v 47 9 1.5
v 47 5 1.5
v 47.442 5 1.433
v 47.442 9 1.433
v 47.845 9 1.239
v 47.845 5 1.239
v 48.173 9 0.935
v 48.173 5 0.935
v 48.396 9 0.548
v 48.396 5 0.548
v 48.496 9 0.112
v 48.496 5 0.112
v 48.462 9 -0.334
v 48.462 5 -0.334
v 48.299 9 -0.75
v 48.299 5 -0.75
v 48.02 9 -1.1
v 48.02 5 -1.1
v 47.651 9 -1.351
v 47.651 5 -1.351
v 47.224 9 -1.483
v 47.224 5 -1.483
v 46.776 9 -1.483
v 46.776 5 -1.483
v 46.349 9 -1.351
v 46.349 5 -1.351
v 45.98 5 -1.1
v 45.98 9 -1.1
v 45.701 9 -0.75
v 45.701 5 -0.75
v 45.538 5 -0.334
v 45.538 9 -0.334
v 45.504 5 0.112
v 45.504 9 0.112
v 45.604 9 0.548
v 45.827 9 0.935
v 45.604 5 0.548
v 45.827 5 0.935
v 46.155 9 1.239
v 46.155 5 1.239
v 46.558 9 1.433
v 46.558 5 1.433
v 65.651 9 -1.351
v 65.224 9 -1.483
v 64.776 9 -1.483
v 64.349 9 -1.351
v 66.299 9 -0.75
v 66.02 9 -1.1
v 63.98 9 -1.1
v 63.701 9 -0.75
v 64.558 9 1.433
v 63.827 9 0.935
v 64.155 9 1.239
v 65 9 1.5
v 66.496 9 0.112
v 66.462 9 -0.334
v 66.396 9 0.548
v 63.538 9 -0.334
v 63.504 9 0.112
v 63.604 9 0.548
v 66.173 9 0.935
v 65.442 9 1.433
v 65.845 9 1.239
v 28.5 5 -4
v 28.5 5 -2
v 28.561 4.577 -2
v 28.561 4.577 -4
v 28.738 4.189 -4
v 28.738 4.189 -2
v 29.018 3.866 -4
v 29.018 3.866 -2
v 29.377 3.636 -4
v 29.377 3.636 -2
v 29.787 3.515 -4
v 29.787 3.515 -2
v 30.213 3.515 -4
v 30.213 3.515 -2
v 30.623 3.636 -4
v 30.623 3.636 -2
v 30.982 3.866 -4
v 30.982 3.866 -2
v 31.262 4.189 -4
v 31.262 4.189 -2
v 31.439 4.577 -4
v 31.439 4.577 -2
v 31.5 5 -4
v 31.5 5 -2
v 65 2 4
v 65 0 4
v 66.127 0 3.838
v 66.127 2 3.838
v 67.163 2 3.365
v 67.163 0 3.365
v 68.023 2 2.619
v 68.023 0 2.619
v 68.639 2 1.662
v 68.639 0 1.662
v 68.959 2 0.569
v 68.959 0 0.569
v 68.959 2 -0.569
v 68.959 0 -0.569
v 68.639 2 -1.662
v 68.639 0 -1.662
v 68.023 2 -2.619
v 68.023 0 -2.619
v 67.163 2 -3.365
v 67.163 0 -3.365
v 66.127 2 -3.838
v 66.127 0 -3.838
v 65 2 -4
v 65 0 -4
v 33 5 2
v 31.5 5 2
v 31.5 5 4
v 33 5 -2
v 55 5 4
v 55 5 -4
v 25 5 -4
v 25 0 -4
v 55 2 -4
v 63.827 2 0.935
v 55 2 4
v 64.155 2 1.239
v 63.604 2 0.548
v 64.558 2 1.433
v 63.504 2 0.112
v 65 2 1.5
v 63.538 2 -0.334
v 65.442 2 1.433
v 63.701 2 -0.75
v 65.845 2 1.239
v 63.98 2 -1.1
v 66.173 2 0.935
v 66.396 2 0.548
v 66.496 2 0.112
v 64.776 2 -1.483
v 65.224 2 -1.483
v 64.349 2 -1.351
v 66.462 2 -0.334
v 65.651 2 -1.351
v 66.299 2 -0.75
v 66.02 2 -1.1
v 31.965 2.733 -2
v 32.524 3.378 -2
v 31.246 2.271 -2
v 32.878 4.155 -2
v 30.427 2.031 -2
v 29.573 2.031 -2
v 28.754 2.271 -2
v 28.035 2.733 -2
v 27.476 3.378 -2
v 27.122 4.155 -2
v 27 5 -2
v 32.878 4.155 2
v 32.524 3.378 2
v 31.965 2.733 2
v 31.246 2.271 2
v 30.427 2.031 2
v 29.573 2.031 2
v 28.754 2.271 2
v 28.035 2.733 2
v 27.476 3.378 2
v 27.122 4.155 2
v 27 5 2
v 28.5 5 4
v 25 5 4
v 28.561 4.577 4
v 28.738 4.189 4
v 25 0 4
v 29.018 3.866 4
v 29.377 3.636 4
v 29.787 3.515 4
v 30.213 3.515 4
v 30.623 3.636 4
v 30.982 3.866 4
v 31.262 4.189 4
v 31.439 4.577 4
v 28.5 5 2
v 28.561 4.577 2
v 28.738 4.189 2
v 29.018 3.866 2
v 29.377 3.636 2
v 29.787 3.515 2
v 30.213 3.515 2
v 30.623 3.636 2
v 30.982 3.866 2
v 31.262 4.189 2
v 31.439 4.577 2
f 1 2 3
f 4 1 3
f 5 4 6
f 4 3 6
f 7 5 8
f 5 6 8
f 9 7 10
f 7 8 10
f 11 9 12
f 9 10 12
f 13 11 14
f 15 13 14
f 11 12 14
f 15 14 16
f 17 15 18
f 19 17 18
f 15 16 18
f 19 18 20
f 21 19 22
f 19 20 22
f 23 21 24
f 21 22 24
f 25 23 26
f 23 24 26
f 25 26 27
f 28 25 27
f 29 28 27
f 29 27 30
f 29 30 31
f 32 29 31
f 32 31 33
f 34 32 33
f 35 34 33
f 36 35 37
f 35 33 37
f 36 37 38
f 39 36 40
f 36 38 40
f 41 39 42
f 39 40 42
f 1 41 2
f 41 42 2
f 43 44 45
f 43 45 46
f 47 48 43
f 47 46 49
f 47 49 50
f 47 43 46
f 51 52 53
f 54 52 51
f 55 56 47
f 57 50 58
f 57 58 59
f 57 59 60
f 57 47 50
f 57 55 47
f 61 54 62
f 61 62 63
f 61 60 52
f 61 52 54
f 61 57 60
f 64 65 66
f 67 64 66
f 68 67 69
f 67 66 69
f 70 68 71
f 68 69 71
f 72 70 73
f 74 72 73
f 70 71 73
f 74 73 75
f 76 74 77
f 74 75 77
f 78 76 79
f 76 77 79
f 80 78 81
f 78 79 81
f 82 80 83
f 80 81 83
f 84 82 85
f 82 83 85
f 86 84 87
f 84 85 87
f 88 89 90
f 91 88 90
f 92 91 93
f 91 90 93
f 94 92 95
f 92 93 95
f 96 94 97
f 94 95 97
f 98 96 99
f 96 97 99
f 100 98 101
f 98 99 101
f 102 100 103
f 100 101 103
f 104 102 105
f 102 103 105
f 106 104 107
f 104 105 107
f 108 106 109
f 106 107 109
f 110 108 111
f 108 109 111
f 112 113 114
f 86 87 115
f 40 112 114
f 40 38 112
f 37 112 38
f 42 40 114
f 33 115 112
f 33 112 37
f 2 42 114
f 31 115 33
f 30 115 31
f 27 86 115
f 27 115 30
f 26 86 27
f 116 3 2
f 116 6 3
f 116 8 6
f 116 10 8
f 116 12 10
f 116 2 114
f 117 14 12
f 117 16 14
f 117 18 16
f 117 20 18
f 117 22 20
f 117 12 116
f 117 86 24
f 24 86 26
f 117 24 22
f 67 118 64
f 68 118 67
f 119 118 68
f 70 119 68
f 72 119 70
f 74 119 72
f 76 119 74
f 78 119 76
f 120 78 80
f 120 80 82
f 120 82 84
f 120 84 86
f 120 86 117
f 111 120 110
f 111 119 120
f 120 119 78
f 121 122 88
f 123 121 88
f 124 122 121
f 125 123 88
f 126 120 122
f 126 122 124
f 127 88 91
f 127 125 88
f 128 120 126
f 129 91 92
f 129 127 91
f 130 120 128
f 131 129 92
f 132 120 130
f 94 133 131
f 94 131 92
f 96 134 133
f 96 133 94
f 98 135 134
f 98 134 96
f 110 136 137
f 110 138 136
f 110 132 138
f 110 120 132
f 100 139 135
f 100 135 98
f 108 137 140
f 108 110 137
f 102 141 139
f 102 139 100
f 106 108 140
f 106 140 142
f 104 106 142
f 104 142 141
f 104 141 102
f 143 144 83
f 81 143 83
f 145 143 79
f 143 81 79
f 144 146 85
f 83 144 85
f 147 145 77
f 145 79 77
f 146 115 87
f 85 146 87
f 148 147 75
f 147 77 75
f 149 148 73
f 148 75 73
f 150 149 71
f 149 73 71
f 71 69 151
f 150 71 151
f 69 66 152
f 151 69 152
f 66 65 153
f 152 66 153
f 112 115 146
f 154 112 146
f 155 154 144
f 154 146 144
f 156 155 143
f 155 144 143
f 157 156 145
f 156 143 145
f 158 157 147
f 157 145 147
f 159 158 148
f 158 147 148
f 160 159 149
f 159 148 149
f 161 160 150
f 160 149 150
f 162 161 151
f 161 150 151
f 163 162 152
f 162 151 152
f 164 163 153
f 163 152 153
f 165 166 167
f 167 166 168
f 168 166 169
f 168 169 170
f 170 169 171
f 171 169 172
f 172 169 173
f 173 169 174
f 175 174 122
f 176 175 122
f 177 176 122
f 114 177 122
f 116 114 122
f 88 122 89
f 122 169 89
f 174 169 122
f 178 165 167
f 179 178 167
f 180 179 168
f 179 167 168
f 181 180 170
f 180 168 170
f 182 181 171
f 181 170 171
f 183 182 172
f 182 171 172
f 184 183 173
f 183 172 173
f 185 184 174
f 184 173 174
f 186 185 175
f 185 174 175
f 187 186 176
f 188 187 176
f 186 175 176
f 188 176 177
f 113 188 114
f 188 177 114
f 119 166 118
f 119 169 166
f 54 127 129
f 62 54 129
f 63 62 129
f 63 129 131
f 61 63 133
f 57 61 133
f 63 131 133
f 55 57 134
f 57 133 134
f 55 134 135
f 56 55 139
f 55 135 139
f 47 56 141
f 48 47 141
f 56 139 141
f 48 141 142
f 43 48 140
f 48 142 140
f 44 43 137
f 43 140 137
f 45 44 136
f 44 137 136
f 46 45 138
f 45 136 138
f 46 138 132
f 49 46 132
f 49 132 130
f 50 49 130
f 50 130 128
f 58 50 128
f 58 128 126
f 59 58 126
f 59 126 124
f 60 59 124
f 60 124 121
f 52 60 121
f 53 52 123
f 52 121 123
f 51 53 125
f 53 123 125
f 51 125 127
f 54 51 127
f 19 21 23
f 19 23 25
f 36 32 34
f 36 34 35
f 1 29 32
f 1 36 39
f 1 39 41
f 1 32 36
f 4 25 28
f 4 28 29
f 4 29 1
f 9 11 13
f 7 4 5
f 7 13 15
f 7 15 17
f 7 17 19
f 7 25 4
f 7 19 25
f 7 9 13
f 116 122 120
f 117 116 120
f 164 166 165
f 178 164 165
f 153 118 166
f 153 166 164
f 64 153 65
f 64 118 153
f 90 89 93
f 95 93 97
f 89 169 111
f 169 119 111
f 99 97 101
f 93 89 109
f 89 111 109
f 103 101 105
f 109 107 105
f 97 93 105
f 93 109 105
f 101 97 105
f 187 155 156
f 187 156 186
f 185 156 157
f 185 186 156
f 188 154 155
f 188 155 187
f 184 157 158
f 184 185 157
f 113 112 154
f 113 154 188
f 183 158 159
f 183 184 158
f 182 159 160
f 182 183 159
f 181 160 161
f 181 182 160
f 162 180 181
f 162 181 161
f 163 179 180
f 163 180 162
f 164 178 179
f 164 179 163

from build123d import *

# Parameters (mm, degrees)
BOSS_EXTRUDE2_DEPTH     = 2
SKETCH3_W               = 30
SKETCH3_H               = 8
BOSS_EXTRUDE3_DEPTH     = 3
SKETCH4_R               = 1.5
BOSS_EXTRUDE4_DEPTH     = 7
SKETCH12_R              = 1.5
BOSS_EXTRUDE6_DEPTH     = 4
CUT_EXTRUDE1_DEPTH      = 71.042844031
CUT_EXTRUDE2_DEPTH      = 2
CUT_EXTRUDE2_DEPTH_BACK = 2


with BuildPart() as part:
    # Sketch1 → Boss-Extrude2 (new body)
    with BuildSketch(Plane(origin=(0, 0, 0), x_dir=(1, 0, 0), z_dir=(0, 1, 0))):
        with BuildLine():
            Line((25, -4), (65, -4))
            ThreePointArc((65, -4), (69, 0), (65, 4))
            Line((65, 4), (25, 4))
            Line((25, 4), (25, -4))
        make_face()
    extrude(amount=BOSS_EXTRUDE2_DEPTH)

    # Sketch3 → Boss-Extrude3 (add)
    with BuildSketch(Plane(origin=(0, 2, 0), x_dir=(1, 0, 0), z_dir=(0, 1, 0))):
        with Locations((40, 0)):
            Rectangle(SKETCH3_W, SKETCH3_H)
    extrude(amount=BOSS_EXTRUDE3_DEPTH)

    # Sketch4 → Boss-Extrude4 (add)
    with BuildSketch(Plane(origin=(0, 2, 0), x_dir=(1, 0, 0), z_dir=(0, 1, 0))):
        with Locations(Location((65, 0, 0), (0, 0, 270))):
            Circle(SKETCH4_R)
    extrude(amount=BOSS_EXTRUDE4_DEPTH)

    # Sketch12 → Boss-Extrude6 (add)
    with BuildSketch(Plane(origin=(0, 5, 0), x_dir=(1, 0, 0), z_dir=(0, 1, 0))):
        with Locations(Location((47, 0, 0), (0, 0, 270))):
            Circle(SKETCH12_R)
    extrude(amount=BOSS_EXTRUDE6_DEPTH)

    # Sketch13 → Cut-Extrude1 (cut, through all)
    with BuildSketch(Plane.XY.offset(4)):
        with BuildLine():
            Line((31.5, 5), (28.5, 5))
            ThreePointArc((28.5, 5), (30, 3.5), (31.5, 5))
        make_face()
    extrude(amount=-CUT_EXTRUDE1_DEPTH, mode=Mode.SUBTRACT)

    # Sketch14 → Cut-Extrude2 (cut, two sides: drawn at the far end of the back side and taken through both)
    with BuildSketch(Plane.XY.offset(-CUT_EXTRUDE2_DEPTH_BACK)):
        with BuildLine():
            Line((27, 5), (33, 5))
            ThreePointArc((33, 5), (30, 2), (27, 5))
        make_face()
    extrude(amount=CUT_EXTRUDE2_DEPTH + CUT_EXTRUDE2_DEPTH_BACK, mode=Mode.SUBTRACT)


solid = part.part
